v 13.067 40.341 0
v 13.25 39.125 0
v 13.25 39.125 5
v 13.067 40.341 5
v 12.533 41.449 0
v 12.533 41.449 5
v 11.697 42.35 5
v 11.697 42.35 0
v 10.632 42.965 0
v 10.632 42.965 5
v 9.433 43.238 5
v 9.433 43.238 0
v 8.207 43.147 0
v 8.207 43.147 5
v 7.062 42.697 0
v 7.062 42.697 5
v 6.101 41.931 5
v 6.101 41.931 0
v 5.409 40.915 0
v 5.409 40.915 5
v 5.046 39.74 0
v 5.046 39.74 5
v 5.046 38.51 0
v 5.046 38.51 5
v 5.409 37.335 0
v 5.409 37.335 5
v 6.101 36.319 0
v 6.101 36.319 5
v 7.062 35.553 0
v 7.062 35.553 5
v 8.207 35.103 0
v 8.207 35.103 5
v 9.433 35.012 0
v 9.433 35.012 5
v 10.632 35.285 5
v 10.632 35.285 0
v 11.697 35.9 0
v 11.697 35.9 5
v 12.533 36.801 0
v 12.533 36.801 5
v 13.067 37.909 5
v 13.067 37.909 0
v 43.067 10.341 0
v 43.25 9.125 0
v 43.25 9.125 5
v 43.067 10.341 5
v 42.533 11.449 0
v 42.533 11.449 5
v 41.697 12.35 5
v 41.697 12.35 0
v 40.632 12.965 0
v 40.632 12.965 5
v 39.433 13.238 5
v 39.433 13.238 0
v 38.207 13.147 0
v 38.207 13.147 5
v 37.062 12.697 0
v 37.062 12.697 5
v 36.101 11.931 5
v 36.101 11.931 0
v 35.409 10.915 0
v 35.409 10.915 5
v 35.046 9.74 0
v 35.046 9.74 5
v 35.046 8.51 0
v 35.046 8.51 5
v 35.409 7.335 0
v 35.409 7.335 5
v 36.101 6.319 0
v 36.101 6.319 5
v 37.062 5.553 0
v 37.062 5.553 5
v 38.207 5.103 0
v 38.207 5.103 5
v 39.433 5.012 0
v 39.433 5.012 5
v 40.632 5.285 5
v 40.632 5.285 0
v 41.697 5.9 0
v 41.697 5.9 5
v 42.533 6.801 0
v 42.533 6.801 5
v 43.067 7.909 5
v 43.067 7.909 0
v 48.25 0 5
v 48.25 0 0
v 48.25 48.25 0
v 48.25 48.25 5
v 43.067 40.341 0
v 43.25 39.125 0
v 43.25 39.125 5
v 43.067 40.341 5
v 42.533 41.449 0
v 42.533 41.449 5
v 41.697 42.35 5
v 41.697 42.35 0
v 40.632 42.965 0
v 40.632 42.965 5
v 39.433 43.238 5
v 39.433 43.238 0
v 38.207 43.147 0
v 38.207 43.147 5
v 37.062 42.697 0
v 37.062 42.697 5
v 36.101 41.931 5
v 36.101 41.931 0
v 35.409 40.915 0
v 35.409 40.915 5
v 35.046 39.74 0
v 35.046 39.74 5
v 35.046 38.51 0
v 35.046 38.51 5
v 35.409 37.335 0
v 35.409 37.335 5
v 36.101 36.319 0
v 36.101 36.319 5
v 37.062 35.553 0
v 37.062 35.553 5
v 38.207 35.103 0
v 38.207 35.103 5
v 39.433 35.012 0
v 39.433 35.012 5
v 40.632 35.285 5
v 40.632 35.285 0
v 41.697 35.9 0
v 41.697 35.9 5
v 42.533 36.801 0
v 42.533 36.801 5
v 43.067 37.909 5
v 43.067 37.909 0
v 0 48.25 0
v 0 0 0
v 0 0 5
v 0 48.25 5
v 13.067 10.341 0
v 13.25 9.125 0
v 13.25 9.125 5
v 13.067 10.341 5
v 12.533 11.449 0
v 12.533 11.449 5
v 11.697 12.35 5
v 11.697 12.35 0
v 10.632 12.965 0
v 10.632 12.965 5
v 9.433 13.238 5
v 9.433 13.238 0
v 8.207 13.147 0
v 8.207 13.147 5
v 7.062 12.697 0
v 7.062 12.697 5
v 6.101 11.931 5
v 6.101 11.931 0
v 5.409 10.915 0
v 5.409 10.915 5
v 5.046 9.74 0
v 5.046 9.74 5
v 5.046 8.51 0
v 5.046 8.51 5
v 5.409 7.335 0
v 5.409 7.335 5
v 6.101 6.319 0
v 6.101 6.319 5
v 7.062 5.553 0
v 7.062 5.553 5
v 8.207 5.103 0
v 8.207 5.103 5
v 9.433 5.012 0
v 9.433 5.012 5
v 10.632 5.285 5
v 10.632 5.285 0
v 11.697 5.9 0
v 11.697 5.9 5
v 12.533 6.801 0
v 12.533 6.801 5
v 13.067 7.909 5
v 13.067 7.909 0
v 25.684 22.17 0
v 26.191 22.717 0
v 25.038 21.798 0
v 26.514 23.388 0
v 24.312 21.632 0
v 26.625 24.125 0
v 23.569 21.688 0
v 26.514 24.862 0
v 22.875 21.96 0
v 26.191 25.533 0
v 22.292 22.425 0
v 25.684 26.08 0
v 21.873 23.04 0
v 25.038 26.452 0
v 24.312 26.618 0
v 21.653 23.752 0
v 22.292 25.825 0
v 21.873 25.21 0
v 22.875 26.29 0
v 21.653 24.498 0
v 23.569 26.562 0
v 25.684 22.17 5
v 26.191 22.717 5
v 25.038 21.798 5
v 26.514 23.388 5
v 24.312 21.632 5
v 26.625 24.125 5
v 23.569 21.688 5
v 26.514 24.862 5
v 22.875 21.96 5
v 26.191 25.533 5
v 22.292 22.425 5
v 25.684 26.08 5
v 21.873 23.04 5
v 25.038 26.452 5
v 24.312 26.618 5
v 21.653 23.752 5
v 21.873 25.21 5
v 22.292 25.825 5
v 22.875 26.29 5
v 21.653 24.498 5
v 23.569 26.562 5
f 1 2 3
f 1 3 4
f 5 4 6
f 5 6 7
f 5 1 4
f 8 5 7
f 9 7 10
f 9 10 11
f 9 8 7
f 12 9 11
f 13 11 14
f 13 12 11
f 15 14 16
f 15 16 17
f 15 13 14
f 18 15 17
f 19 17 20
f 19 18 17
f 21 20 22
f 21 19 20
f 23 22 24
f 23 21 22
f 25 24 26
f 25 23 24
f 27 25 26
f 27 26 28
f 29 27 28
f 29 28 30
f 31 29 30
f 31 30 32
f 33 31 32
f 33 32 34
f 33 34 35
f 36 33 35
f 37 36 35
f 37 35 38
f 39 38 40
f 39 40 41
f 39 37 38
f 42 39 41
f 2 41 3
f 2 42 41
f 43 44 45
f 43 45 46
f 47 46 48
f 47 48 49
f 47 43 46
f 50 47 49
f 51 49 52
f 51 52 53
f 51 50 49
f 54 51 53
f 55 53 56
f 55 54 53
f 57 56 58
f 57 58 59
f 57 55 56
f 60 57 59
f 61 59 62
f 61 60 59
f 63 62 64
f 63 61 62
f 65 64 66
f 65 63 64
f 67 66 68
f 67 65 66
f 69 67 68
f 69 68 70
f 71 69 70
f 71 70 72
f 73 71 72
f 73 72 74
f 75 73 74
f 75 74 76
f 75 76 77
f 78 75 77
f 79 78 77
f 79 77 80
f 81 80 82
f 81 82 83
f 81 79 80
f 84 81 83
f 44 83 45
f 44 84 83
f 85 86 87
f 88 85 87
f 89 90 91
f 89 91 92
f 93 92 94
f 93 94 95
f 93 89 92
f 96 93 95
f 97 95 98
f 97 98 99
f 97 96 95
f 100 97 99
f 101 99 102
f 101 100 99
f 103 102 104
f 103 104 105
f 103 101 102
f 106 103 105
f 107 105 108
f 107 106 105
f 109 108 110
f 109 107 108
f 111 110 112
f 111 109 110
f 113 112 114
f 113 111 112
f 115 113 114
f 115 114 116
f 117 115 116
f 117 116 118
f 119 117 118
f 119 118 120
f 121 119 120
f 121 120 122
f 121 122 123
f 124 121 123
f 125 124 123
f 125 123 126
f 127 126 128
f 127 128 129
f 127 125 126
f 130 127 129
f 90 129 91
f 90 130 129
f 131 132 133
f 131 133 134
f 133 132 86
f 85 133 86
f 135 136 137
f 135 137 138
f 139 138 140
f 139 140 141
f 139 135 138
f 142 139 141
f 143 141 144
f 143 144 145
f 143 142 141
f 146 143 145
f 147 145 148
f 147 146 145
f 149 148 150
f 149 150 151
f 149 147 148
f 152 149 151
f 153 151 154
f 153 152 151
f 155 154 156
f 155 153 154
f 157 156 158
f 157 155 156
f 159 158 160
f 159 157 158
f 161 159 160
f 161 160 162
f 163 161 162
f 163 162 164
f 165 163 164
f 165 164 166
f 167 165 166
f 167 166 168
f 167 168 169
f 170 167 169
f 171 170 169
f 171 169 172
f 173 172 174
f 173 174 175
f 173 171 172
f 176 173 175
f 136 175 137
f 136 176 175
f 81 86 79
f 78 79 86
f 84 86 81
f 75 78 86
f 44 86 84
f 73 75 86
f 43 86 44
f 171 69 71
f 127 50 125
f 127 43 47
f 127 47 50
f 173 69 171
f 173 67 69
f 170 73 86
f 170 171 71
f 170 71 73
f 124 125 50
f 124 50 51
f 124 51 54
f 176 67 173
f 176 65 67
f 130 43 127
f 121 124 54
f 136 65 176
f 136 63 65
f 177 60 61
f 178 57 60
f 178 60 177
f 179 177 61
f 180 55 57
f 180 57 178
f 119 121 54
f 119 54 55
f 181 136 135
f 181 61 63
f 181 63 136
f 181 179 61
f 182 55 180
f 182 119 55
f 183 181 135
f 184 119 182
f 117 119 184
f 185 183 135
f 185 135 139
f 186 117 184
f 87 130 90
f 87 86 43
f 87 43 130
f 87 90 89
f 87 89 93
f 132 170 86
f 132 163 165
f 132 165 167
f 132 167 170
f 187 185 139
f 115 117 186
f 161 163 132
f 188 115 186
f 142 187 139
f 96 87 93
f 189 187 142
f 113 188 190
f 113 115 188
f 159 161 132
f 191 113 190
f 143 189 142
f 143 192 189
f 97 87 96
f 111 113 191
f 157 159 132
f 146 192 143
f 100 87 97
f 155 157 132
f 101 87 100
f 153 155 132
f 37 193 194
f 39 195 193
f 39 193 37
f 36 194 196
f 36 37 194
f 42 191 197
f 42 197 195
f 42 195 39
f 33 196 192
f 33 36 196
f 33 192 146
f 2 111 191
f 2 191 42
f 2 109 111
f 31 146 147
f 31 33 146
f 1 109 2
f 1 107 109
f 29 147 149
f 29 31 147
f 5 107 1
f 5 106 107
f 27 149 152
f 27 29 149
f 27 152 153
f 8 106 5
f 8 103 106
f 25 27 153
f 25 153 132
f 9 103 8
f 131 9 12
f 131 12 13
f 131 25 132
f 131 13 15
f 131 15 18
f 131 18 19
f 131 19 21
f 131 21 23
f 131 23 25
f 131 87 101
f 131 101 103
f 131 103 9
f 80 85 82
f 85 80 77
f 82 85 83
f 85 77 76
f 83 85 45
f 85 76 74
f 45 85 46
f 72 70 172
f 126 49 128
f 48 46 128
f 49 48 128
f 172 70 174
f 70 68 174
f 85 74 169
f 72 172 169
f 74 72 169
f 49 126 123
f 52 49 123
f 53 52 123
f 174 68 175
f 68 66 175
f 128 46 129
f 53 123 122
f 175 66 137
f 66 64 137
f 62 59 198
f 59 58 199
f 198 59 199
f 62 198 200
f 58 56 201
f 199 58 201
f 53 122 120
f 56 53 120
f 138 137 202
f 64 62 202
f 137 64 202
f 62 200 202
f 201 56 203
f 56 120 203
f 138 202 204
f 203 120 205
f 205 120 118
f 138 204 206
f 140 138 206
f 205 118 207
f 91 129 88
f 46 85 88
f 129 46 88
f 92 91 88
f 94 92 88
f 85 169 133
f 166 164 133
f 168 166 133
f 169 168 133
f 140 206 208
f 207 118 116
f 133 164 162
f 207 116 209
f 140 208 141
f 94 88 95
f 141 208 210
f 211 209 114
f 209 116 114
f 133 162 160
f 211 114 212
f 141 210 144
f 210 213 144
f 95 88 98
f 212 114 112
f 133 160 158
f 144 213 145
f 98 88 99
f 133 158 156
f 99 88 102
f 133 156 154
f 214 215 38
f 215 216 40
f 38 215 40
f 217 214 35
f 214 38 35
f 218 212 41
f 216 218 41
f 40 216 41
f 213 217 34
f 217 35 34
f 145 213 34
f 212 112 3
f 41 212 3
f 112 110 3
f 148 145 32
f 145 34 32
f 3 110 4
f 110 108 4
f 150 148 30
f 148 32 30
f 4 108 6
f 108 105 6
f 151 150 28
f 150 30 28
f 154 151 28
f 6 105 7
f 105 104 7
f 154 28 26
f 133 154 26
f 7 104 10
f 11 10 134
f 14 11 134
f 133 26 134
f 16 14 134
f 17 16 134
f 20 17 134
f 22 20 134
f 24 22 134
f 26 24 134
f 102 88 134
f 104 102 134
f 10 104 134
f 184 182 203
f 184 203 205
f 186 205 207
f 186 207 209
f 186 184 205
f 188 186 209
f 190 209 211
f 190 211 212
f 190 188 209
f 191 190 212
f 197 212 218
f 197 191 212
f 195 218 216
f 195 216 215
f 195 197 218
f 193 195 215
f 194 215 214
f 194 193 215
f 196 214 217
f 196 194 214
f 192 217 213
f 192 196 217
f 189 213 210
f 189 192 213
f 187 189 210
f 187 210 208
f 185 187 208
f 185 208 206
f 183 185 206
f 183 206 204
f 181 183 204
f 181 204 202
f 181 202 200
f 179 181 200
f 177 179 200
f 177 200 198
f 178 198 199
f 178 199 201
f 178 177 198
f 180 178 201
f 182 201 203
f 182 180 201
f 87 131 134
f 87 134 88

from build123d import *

# Parameters (mm, degrees)
SKETCH1_W           = 48.25
SKETCH1_H           = 48.25
SKETCH1_R           = 2.5
SKETCH1_R_2         = 4.125
BOSS_EXTRUDE1_DEPTH = 5


with BuildPart() as part:
    # Sketch1 → Boss-Extrude1 (new body)
    # profile 1 of 5: a face of its own
    with BuildSketch(Plane.XY):
        with Locations((24.125, 24.125)):
            Rectangle(SKETCH1_W, SKETCH1_H)
        with Locations((24.125, 24.125)):
            Circle(SKETCH1_R, mode=Mode.SUBTRACT)
        Polygon((34.895909278, 1.8), (30.666818556, 9.125), (34.895909278, 16.45), (43.354090722, 16.45), (47.583181444, 9.125), (43.354090722, 1.8), align=None, mode=Mode.SUBTRACT)
        Polygon((13.354090722, 1.8), (17.583181444, 9.125), (13.354090722, 16.45), (4.895909278, 16.45), (0.666818556, 9.125), (4.895909278, 1.8), align=None, mode=Mode.SUBTRACT)
        Polygon((34.895909278, 31.8), (43.354090722, 31.8), (47.583181444, 39.125), (43.354090722, 46.45), (34.895909278, 46.45), (30.666818556, 39.125), align=None, mode=Mode.SUBTRACT)
        Polygon((17.583181444, 39.125), (13.354090722, 31.8), (4.895909278, 31.8), (0.666818556, 39.125), (4.895909278, 46.45), (13.354090722, 46.45), align=None, mode=Mode.SUBTRACT)
    # profile 2 of 5: a face of its own
    with BuildSketch(Plane.XY):
        Polygon((30.666818556, 39.125), (34.895909278, 31.8), (43.354090722, 31.8), (47.583181444, 39.125), (43.354090722, 46.45), (34.895909278, 46.45), align=None)
        with Locations((39.125, 39.125)):
            Circle(SKETCH1_R_2, mode=Mode.SUBTRACT)
    # profile 3 of 5: a face of its own
    with BuildSketch(Plane.XY):
        Polygon((30.666818556, 9.125), (34.895909278, 16.45), (43.354090722, 16.45), (47.583181444, 9.125), (43.354090722, 1.8), (34.895909278, 1.8), align=None)
        with Locations((39.125, 9.125)):
            Circle(SKETCH1_R_2, mode=Mode.SUBTRACT)
    # profile 4 of 5: a face of its own
    with BuildSketch(Plane.XY):
        Polygon((4.895909278, 1.8), (13.354090722, 1.8), (17.583181444, 9.125), (13.354090722, 16.45), (4.895909278, 16.45), (0.666818556, 9.125), align=None)
        with Locations((9.125, 9.125)):
            Circle(SKETCH1_R_2, mode=Mode.SUBTRACT)
    # profile 5 of 5: a face of its own
    with BuildSketch(Plane.XY):
        Polygon((13.354090722, 31.8), (4.895909278, 31.8), (0.666818556, 39.125), (4.895909278, 46.45), (13.354090722, 46.45), (17.583181444, 39.125), align=None)
        with Locations((9.125, 39.125)):
            Circle(SKETCH1_R_2, mode=Mode.SUBTRACT)
    extrude(amount=BOSS_EXTRUDE1_DEPTH)


solid = part.part
